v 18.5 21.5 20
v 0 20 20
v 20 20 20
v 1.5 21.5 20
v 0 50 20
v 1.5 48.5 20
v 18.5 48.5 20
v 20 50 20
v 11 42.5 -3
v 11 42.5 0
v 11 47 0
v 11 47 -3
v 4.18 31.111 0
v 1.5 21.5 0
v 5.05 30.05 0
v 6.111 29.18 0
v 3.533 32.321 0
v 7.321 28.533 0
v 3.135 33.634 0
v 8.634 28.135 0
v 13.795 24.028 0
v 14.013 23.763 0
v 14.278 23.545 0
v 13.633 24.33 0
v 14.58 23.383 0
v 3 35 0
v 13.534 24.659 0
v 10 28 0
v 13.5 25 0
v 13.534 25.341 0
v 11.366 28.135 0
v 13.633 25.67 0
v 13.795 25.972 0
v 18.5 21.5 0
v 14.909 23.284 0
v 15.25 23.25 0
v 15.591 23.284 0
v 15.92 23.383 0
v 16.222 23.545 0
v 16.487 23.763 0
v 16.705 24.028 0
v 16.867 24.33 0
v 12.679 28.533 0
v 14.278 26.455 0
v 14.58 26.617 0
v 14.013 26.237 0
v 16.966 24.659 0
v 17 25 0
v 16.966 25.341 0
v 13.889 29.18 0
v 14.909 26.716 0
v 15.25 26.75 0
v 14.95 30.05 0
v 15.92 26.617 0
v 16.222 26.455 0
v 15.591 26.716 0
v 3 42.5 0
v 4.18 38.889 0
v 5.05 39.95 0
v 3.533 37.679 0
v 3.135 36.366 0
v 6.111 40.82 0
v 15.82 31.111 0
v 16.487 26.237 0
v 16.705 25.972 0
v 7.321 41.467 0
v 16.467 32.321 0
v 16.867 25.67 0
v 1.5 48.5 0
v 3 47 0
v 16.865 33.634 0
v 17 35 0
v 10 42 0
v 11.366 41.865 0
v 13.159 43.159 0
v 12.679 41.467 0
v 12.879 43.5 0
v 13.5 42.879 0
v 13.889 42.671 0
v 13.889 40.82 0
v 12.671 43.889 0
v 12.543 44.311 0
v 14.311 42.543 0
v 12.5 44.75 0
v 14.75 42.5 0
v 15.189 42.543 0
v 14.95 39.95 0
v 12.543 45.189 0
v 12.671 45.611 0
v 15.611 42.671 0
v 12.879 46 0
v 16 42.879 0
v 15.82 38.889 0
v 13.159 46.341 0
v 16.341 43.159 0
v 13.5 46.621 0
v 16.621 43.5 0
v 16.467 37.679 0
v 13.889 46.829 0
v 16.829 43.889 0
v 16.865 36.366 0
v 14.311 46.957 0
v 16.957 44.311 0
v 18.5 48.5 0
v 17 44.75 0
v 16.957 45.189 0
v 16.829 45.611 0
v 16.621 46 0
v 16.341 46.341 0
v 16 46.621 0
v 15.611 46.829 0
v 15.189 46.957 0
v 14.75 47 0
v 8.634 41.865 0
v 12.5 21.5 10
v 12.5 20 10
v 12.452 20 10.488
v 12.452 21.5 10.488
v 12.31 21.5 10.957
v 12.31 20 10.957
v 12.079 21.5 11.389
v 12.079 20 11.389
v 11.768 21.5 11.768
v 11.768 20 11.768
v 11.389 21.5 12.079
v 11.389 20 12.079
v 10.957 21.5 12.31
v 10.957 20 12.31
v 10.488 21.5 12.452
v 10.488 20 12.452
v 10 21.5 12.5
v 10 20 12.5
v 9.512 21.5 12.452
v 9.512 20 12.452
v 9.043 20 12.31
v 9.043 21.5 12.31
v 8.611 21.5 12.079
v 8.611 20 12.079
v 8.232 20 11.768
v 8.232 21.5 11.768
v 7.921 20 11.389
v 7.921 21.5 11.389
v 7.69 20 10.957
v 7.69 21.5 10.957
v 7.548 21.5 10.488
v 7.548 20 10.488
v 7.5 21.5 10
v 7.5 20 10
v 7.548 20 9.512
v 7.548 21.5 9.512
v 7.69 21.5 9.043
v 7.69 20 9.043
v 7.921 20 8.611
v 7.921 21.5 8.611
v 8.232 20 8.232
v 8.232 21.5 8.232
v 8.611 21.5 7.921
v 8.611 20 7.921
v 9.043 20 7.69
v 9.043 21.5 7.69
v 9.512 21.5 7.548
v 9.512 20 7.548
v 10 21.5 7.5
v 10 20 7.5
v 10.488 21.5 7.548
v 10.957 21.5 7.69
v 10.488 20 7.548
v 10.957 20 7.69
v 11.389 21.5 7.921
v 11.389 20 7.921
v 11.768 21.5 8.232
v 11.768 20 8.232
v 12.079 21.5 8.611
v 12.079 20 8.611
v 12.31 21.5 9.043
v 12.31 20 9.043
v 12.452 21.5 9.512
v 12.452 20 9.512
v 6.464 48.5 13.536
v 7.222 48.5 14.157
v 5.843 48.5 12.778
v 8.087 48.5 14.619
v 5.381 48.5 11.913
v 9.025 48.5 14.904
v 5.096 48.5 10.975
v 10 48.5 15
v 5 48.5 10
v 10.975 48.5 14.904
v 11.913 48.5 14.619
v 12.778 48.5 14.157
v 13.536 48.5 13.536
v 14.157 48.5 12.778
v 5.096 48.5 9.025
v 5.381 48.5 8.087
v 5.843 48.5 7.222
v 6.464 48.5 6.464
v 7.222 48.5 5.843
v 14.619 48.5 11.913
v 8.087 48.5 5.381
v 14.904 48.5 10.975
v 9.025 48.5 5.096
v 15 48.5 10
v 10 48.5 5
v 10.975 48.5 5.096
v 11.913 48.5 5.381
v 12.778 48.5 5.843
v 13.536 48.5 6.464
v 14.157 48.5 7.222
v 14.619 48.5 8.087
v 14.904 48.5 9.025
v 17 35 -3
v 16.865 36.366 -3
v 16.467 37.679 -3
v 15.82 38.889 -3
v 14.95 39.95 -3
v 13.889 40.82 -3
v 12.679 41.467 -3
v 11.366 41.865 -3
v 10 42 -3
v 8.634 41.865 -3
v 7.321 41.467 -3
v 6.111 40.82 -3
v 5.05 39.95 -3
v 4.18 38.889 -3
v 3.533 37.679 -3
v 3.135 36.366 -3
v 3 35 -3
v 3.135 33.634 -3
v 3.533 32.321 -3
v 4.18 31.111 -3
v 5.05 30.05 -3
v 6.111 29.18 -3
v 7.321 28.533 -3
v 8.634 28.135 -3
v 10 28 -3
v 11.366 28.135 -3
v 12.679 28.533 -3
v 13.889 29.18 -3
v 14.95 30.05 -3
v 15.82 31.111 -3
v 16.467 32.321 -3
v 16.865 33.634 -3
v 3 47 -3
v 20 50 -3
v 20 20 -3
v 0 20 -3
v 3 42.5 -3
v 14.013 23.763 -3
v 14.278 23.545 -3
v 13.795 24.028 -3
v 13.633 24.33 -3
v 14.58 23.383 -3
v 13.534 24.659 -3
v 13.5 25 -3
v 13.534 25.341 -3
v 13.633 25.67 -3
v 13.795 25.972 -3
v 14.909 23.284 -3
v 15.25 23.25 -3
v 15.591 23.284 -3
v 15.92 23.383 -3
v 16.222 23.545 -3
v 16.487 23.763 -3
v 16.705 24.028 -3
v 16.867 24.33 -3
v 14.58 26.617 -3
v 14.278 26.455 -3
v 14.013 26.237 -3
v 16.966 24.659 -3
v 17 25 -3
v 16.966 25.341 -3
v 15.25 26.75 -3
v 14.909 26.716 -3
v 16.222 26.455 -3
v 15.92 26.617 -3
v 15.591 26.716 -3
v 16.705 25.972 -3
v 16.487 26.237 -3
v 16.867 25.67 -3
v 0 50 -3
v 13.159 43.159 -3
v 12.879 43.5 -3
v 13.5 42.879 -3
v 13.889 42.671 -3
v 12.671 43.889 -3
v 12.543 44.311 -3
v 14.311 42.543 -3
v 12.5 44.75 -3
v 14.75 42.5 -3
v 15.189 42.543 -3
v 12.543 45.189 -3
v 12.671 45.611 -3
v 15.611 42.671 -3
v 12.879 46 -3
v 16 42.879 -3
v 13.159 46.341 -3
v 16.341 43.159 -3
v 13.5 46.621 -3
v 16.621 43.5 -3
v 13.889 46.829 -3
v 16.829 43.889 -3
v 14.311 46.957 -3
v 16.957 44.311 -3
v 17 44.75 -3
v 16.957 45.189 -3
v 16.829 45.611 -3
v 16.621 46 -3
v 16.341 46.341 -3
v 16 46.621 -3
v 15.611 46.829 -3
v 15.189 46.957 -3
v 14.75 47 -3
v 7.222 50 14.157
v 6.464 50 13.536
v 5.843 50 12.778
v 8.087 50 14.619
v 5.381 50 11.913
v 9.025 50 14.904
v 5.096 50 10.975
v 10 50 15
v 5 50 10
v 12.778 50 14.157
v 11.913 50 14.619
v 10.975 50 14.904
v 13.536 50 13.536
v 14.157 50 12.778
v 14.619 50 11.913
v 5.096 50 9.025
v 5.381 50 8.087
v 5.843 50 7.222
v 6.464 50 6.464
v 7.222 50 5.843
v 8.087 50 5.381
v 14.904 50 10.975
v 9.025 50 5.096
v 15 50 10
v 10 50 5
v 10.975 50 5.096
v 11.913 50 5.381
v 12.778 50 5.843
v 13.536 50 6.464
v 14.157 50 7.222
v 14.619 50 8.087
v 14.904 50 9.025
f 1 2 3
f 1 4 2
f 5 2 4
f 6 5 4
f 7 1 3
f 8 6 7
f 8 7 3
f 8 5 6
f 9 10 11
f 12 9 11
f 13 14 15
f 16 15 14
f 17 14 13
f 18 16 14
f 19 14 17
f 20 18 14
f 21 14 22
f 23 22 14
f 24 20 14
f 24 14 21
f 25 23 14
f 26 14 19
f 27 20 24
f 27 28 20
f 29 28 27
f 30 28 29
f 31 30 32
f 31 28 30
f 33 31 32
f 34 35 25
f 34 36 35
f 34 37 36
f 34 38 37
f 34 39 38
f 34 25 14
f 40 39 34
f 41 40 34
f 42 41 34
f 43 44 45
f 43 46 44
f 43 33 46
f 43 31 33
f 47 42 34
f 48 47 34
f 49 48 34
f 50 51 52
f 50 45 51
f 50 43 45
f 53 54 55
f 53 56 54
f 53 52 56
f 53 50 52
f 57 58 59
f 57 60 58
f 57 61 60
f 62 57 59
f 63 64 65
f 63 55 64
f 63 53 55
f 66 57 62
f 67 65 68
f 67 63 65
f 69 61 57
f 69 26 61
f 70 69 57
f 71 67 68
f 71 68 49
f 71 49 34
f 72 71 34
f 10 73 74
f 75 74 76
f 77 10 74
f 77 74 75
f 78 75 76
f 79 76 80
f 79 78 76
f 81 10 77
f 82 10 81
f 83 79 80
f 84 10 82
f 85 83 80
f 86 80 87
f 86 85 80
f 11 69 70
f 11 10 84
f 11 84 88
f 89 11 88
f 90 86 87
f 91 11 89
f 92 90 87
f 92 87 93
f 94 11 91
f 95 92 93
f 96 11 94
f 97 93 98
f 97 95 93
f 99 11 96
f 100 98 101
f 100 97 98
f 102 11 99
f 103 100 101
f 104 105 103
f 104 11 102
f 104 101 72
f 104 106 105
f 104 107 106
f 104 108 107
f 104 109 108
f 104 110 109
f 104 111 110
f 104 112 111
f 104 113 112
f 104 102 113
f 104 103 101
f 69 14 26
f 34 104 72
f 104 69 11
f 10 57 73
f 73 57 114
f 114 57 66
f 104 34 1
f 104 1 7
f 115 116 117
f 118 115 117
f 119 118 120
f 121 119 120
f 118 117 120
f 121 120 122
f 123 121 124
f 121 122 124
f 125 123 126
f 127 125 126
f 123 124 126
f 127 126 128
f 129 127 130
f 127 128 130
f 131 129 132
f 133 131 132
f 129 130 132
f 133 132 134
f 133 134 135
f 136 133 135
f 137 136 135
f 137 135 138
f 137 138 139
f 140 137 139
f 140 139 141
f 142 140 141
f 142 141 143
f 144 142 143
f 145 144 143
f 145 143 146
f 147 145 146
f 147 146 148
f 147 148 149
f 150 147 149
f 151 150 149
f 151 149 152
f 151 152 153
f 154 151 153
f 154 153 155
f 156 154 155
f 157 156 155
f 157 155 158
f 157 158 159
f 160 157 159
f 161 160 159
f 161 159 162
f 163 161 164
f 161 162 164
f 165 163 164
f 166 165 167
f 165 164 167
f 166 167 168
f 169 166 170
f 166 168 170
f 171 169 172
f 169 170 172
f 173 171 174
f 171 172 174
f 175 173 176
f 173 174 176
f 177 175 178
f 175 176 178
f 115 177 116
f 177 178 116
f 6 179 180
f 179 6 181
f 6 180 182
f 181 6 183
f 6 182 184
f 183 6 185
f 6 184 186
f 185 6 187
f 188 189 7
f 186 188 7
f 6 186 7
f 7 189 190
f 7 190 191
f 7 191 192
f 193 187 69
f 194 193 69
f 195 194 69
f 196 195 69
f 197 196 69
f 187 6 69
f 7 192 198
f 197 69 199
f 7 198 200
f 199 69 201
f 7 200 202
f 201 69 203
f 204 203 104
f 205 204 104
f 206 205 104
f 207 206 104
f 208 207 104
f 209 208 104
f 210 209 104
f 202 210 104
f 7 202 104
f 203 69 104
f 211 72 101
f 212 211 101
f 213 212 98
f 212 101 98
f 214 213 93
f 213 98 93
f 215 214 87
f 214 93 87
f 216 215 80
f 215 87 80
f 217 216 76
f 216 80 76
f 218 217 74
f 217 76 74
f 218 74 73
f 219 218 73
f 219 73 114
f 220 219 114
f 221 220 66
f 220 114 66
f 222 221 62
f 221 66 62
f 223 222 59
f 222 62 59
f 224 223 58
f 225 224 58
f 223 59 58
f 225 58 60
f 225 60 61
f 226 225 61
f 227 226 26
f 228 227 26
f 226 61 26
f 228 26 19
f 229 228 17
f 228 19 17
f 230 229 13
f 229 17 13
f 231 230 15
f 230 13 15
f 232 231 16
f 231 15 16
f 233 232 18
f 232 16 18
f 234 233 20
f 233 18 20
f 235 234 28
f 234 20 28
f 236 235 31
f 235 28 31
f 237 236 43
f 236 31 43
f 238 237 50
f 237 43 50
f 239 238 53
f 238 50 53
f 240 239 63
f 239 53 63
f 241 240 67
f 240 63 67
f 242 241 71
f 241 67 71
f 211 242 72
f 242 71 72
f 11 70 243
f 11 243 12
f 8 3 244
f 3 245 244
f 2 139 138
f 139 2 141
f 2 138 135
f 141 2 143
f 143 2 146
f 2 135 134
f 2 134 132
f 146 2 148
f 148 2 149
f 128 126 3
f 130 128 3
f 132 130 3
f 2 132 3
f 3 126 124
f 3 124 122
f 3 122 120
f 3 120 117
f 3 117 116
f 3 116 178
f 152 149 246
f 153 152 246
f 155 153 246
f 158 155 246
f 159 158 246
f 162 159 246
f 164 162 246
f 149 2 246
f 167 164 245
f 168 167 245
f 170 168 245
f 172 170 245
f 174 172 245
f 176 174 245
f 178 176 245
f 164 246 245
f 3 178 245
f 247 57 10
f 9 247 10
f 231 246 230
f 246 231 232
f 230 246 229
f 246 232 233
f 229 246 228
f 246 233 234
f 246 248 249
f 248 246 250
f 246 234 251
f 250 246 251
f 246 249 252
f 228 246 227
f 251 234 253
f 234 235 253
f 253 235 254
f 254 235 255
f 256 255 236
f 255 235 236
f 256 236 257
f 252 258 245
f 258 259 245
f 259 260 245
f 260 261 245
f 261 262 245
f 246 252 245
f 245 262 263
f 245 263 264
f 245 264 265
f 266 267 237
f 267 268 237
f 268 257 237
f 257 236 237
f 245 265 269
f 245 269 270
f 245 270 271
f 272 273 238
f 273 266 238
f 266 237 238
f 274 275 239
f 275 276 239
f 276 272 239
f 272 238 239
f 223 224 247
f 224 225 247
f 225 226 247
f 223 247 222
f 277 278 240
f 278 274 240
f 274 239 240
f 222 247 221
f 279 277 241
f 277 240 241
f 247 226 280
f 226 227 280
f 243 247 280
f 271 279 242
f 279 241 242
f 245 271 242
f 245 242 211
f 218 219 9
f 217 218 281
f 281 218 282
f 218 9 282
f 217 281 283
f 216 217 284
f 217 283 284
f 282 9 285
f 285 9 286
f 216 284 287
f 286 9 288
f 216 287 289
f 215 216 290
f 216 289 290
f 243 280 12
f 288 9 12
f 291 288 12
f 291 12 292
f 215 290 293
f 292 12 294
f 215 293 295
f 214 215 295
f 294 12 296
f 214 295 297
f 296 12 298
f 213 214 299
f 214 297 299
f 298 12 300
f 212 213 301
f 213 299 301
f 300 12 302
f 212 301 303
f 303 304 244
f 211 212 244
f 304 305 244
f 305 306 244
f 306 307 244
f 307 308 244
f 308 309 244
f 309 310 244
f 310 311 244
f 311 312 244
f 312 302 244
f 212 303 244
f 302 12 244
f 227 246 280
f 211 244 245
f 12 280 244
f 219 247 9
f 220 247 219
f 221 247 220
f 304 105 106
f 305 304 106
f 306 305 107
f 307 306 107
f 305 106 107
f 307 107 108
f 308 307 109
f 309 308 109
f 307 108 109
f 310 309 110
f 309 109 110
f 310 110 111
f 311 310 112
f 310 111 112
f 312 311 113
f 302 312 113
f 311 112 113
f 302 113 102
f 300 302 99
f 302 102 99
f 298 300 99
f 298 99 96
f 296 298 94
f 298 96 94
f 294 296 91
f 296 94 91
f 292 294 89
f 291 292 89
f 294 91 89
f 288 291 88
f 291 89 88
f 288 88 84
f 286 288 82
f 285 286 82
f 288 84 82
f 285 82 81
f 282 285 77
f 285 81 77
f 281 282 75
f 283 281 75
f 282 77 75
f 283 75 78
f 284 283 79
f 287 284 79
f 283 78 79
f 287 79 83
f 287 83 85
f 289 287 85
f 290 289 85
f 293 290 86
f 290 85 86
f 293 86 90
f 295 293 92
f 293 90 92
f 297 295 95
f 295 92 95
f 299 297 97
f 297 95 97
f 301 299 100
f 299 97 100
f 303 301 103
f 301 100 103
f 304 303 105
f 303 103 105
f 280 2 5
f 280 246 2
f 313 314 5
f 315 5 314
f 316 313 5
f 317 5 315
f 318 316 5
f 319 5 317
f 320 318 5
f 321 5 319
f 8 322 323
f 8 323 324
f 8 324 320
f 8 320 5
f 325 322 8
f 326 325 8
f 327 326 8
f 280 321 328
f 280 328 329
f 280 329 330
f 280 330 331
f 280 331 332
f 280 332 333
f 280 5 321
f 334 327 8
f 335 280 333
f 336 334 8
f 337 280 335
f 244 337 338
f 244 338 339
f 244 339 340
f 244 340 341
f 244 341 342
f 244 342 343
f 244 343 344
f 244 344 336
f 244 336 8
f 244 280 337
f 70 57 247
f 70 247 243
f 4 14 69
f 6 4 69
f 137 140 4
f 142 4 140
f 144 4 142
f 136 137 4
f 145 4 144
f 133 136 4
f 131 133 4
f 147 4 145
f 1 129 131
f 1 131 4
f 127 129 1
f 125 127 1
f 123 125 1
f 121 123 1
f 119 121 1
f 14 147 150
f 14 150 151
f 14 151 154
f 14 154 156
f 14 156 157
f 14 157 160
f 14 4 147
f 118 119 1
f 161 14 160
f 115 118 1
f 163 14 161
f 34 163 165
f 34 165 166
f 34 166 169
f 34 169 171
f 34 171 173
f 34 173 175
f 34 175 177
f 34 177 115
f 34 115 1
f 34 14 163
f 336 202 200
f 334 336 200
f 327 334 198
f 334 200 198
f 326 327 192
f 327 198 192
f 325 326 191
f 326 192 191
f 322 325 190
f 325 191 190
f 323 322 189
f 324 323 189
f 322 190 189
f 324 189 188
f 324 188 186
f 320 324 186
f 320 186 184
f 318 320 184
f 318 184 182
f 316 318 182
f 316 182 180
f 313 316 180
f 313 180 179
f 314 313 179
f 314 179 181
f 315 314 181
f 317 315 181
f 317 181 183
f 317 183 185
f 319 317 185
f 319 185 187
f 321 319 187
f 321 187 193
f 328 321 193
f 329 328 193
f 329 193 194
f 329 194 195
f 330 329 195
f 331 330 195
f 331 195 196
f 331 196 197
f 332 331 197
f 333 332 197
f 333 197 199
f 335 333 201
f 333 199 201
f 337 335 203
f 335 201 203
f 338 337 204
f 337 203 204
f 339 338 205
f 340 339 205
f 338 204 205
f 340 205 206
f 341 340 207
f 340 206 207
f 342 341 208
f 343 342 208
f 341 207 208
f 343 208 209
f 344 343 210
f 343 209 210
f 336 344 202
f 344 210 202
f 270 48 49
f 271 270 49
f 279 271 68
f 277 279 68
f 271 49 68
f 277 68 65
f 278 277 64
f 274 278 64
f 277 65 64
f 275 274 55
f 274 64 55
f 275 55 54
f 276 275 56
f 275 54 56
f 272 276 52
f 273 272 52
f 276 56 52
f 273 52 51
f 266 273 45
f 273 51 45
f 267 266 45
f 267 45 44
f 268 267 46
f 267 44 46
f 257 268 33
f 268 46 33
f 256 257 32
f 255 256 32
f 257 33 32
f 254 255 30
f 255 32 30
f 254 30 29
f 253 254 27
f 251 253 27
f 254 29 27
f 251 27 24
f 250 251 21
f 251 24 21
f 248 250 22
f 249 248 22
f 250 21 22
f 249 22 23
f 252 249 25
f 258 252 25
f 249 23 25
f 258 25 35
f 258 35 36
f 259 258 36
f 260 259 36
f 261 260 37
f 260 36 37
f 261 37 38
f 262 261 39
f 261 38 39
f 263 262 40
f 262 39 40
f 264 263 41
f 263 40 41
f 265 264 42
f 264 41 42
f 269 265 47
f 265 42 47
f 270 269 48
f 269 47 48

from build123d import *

# Parameters (mm, degrees)
SKETCH1_W           = 20
SKETCH1_H           = 30
SKETCH1_W_2         = 8
SKETCH1_H_2         = 4.5
SKETCH1_R           = 1.75
SKETCH1_R_2         = 2.25
SKETCH1_R_3         = 7
BOSS_EXTRUDE1_DEPTH = 3
SKETCH1_3_W         = 20
SKETCH1_3_H         = 30
SKETCH1_3_W_2       = 17
SKETCH1_3_H_2       = 27
BOSS_EXTRUDE2_DEPTH = 20
SKETCH2_R           = 2.5
CUT_EXTRUDE1_DEPTH  = 42.231056256
CUT_EXTRUDE2_START  = -28.5
SKETCH2_3_R         = 5
SKETCH2_3_R_2       = 2.5
CUT_EXTRUDE2_DEPTH  = 13.731056256


with BuildPart() as part:
    # Sketch1 → Boss-Extrude1 (new body)
    with BuildSketch(Plane.XY):
        with Locations((10, 35)):
            Rectangle(SKETCH1_W, SKETCH1_H)
        with Locations((7, 44.75)):
            Rectangle(SKETCH1_W_2, SKETCH1_H_2, mode=Mode.SUBTRACT)
        with Locations((15.25, 25)):
            Circle(SKETCH1_R, mode=Mode.SUBTRACT)
        with Locations((14.75, 44.75)):
            Circle(SKETCH1_R_2, mode=Mode.SUBTRACT)
        with Locations((10, 35)):
            Circle(SKETCH1_R_3, mode=Mode.SUBTRACT)
    extrude(amount=-BOSS_EXTRUDE1_DEPTH)

    # Sketch1<3> → Boss-Extrude2 (add)
    with BuildSketch(Plane.XY):
        with Locations((10, 35)):
            Rectangle(SKETCH1_3_W, SKETCH1_3_H)
        with Locations((10, 35)):
            Rectangle(SKETCH1_3_W_2, SKETCH1_3_H_2, mode=Mode.SUBTRACT)
    extrude(amount=BOSS_EXTRUDE2_DEPTH)

    # Sketch2 → Cut-Extrude1 (cut, through all)
    with BuildSketch(Plane.XZ.offset(-20)):
        with Locations((10, 10)):
            Circle(SKETCH2_R)
    extrude(amount=-CUT_EXTRUDE1_DEPTH, mode=Mode.SUBTRACT)

    # Sketch2<3> → Cut-Extrude2 (cut, through all)
    with BuildSketch(Plane.XZ.offset(-20).offset(CUT_EXTRUDE2_START)):
        with Locations((10, 10)):
            Circle(SKETCH2_3_R)
        with Locations((10, 10)):
            Circle(SKETCH2_3_R_2, mode=Mode.SUBTRACT)
    extrude(amount=-CUT_EXTRUDE2_DEPTH, mode=Mode.SUBTRACT)


solid = part.part
